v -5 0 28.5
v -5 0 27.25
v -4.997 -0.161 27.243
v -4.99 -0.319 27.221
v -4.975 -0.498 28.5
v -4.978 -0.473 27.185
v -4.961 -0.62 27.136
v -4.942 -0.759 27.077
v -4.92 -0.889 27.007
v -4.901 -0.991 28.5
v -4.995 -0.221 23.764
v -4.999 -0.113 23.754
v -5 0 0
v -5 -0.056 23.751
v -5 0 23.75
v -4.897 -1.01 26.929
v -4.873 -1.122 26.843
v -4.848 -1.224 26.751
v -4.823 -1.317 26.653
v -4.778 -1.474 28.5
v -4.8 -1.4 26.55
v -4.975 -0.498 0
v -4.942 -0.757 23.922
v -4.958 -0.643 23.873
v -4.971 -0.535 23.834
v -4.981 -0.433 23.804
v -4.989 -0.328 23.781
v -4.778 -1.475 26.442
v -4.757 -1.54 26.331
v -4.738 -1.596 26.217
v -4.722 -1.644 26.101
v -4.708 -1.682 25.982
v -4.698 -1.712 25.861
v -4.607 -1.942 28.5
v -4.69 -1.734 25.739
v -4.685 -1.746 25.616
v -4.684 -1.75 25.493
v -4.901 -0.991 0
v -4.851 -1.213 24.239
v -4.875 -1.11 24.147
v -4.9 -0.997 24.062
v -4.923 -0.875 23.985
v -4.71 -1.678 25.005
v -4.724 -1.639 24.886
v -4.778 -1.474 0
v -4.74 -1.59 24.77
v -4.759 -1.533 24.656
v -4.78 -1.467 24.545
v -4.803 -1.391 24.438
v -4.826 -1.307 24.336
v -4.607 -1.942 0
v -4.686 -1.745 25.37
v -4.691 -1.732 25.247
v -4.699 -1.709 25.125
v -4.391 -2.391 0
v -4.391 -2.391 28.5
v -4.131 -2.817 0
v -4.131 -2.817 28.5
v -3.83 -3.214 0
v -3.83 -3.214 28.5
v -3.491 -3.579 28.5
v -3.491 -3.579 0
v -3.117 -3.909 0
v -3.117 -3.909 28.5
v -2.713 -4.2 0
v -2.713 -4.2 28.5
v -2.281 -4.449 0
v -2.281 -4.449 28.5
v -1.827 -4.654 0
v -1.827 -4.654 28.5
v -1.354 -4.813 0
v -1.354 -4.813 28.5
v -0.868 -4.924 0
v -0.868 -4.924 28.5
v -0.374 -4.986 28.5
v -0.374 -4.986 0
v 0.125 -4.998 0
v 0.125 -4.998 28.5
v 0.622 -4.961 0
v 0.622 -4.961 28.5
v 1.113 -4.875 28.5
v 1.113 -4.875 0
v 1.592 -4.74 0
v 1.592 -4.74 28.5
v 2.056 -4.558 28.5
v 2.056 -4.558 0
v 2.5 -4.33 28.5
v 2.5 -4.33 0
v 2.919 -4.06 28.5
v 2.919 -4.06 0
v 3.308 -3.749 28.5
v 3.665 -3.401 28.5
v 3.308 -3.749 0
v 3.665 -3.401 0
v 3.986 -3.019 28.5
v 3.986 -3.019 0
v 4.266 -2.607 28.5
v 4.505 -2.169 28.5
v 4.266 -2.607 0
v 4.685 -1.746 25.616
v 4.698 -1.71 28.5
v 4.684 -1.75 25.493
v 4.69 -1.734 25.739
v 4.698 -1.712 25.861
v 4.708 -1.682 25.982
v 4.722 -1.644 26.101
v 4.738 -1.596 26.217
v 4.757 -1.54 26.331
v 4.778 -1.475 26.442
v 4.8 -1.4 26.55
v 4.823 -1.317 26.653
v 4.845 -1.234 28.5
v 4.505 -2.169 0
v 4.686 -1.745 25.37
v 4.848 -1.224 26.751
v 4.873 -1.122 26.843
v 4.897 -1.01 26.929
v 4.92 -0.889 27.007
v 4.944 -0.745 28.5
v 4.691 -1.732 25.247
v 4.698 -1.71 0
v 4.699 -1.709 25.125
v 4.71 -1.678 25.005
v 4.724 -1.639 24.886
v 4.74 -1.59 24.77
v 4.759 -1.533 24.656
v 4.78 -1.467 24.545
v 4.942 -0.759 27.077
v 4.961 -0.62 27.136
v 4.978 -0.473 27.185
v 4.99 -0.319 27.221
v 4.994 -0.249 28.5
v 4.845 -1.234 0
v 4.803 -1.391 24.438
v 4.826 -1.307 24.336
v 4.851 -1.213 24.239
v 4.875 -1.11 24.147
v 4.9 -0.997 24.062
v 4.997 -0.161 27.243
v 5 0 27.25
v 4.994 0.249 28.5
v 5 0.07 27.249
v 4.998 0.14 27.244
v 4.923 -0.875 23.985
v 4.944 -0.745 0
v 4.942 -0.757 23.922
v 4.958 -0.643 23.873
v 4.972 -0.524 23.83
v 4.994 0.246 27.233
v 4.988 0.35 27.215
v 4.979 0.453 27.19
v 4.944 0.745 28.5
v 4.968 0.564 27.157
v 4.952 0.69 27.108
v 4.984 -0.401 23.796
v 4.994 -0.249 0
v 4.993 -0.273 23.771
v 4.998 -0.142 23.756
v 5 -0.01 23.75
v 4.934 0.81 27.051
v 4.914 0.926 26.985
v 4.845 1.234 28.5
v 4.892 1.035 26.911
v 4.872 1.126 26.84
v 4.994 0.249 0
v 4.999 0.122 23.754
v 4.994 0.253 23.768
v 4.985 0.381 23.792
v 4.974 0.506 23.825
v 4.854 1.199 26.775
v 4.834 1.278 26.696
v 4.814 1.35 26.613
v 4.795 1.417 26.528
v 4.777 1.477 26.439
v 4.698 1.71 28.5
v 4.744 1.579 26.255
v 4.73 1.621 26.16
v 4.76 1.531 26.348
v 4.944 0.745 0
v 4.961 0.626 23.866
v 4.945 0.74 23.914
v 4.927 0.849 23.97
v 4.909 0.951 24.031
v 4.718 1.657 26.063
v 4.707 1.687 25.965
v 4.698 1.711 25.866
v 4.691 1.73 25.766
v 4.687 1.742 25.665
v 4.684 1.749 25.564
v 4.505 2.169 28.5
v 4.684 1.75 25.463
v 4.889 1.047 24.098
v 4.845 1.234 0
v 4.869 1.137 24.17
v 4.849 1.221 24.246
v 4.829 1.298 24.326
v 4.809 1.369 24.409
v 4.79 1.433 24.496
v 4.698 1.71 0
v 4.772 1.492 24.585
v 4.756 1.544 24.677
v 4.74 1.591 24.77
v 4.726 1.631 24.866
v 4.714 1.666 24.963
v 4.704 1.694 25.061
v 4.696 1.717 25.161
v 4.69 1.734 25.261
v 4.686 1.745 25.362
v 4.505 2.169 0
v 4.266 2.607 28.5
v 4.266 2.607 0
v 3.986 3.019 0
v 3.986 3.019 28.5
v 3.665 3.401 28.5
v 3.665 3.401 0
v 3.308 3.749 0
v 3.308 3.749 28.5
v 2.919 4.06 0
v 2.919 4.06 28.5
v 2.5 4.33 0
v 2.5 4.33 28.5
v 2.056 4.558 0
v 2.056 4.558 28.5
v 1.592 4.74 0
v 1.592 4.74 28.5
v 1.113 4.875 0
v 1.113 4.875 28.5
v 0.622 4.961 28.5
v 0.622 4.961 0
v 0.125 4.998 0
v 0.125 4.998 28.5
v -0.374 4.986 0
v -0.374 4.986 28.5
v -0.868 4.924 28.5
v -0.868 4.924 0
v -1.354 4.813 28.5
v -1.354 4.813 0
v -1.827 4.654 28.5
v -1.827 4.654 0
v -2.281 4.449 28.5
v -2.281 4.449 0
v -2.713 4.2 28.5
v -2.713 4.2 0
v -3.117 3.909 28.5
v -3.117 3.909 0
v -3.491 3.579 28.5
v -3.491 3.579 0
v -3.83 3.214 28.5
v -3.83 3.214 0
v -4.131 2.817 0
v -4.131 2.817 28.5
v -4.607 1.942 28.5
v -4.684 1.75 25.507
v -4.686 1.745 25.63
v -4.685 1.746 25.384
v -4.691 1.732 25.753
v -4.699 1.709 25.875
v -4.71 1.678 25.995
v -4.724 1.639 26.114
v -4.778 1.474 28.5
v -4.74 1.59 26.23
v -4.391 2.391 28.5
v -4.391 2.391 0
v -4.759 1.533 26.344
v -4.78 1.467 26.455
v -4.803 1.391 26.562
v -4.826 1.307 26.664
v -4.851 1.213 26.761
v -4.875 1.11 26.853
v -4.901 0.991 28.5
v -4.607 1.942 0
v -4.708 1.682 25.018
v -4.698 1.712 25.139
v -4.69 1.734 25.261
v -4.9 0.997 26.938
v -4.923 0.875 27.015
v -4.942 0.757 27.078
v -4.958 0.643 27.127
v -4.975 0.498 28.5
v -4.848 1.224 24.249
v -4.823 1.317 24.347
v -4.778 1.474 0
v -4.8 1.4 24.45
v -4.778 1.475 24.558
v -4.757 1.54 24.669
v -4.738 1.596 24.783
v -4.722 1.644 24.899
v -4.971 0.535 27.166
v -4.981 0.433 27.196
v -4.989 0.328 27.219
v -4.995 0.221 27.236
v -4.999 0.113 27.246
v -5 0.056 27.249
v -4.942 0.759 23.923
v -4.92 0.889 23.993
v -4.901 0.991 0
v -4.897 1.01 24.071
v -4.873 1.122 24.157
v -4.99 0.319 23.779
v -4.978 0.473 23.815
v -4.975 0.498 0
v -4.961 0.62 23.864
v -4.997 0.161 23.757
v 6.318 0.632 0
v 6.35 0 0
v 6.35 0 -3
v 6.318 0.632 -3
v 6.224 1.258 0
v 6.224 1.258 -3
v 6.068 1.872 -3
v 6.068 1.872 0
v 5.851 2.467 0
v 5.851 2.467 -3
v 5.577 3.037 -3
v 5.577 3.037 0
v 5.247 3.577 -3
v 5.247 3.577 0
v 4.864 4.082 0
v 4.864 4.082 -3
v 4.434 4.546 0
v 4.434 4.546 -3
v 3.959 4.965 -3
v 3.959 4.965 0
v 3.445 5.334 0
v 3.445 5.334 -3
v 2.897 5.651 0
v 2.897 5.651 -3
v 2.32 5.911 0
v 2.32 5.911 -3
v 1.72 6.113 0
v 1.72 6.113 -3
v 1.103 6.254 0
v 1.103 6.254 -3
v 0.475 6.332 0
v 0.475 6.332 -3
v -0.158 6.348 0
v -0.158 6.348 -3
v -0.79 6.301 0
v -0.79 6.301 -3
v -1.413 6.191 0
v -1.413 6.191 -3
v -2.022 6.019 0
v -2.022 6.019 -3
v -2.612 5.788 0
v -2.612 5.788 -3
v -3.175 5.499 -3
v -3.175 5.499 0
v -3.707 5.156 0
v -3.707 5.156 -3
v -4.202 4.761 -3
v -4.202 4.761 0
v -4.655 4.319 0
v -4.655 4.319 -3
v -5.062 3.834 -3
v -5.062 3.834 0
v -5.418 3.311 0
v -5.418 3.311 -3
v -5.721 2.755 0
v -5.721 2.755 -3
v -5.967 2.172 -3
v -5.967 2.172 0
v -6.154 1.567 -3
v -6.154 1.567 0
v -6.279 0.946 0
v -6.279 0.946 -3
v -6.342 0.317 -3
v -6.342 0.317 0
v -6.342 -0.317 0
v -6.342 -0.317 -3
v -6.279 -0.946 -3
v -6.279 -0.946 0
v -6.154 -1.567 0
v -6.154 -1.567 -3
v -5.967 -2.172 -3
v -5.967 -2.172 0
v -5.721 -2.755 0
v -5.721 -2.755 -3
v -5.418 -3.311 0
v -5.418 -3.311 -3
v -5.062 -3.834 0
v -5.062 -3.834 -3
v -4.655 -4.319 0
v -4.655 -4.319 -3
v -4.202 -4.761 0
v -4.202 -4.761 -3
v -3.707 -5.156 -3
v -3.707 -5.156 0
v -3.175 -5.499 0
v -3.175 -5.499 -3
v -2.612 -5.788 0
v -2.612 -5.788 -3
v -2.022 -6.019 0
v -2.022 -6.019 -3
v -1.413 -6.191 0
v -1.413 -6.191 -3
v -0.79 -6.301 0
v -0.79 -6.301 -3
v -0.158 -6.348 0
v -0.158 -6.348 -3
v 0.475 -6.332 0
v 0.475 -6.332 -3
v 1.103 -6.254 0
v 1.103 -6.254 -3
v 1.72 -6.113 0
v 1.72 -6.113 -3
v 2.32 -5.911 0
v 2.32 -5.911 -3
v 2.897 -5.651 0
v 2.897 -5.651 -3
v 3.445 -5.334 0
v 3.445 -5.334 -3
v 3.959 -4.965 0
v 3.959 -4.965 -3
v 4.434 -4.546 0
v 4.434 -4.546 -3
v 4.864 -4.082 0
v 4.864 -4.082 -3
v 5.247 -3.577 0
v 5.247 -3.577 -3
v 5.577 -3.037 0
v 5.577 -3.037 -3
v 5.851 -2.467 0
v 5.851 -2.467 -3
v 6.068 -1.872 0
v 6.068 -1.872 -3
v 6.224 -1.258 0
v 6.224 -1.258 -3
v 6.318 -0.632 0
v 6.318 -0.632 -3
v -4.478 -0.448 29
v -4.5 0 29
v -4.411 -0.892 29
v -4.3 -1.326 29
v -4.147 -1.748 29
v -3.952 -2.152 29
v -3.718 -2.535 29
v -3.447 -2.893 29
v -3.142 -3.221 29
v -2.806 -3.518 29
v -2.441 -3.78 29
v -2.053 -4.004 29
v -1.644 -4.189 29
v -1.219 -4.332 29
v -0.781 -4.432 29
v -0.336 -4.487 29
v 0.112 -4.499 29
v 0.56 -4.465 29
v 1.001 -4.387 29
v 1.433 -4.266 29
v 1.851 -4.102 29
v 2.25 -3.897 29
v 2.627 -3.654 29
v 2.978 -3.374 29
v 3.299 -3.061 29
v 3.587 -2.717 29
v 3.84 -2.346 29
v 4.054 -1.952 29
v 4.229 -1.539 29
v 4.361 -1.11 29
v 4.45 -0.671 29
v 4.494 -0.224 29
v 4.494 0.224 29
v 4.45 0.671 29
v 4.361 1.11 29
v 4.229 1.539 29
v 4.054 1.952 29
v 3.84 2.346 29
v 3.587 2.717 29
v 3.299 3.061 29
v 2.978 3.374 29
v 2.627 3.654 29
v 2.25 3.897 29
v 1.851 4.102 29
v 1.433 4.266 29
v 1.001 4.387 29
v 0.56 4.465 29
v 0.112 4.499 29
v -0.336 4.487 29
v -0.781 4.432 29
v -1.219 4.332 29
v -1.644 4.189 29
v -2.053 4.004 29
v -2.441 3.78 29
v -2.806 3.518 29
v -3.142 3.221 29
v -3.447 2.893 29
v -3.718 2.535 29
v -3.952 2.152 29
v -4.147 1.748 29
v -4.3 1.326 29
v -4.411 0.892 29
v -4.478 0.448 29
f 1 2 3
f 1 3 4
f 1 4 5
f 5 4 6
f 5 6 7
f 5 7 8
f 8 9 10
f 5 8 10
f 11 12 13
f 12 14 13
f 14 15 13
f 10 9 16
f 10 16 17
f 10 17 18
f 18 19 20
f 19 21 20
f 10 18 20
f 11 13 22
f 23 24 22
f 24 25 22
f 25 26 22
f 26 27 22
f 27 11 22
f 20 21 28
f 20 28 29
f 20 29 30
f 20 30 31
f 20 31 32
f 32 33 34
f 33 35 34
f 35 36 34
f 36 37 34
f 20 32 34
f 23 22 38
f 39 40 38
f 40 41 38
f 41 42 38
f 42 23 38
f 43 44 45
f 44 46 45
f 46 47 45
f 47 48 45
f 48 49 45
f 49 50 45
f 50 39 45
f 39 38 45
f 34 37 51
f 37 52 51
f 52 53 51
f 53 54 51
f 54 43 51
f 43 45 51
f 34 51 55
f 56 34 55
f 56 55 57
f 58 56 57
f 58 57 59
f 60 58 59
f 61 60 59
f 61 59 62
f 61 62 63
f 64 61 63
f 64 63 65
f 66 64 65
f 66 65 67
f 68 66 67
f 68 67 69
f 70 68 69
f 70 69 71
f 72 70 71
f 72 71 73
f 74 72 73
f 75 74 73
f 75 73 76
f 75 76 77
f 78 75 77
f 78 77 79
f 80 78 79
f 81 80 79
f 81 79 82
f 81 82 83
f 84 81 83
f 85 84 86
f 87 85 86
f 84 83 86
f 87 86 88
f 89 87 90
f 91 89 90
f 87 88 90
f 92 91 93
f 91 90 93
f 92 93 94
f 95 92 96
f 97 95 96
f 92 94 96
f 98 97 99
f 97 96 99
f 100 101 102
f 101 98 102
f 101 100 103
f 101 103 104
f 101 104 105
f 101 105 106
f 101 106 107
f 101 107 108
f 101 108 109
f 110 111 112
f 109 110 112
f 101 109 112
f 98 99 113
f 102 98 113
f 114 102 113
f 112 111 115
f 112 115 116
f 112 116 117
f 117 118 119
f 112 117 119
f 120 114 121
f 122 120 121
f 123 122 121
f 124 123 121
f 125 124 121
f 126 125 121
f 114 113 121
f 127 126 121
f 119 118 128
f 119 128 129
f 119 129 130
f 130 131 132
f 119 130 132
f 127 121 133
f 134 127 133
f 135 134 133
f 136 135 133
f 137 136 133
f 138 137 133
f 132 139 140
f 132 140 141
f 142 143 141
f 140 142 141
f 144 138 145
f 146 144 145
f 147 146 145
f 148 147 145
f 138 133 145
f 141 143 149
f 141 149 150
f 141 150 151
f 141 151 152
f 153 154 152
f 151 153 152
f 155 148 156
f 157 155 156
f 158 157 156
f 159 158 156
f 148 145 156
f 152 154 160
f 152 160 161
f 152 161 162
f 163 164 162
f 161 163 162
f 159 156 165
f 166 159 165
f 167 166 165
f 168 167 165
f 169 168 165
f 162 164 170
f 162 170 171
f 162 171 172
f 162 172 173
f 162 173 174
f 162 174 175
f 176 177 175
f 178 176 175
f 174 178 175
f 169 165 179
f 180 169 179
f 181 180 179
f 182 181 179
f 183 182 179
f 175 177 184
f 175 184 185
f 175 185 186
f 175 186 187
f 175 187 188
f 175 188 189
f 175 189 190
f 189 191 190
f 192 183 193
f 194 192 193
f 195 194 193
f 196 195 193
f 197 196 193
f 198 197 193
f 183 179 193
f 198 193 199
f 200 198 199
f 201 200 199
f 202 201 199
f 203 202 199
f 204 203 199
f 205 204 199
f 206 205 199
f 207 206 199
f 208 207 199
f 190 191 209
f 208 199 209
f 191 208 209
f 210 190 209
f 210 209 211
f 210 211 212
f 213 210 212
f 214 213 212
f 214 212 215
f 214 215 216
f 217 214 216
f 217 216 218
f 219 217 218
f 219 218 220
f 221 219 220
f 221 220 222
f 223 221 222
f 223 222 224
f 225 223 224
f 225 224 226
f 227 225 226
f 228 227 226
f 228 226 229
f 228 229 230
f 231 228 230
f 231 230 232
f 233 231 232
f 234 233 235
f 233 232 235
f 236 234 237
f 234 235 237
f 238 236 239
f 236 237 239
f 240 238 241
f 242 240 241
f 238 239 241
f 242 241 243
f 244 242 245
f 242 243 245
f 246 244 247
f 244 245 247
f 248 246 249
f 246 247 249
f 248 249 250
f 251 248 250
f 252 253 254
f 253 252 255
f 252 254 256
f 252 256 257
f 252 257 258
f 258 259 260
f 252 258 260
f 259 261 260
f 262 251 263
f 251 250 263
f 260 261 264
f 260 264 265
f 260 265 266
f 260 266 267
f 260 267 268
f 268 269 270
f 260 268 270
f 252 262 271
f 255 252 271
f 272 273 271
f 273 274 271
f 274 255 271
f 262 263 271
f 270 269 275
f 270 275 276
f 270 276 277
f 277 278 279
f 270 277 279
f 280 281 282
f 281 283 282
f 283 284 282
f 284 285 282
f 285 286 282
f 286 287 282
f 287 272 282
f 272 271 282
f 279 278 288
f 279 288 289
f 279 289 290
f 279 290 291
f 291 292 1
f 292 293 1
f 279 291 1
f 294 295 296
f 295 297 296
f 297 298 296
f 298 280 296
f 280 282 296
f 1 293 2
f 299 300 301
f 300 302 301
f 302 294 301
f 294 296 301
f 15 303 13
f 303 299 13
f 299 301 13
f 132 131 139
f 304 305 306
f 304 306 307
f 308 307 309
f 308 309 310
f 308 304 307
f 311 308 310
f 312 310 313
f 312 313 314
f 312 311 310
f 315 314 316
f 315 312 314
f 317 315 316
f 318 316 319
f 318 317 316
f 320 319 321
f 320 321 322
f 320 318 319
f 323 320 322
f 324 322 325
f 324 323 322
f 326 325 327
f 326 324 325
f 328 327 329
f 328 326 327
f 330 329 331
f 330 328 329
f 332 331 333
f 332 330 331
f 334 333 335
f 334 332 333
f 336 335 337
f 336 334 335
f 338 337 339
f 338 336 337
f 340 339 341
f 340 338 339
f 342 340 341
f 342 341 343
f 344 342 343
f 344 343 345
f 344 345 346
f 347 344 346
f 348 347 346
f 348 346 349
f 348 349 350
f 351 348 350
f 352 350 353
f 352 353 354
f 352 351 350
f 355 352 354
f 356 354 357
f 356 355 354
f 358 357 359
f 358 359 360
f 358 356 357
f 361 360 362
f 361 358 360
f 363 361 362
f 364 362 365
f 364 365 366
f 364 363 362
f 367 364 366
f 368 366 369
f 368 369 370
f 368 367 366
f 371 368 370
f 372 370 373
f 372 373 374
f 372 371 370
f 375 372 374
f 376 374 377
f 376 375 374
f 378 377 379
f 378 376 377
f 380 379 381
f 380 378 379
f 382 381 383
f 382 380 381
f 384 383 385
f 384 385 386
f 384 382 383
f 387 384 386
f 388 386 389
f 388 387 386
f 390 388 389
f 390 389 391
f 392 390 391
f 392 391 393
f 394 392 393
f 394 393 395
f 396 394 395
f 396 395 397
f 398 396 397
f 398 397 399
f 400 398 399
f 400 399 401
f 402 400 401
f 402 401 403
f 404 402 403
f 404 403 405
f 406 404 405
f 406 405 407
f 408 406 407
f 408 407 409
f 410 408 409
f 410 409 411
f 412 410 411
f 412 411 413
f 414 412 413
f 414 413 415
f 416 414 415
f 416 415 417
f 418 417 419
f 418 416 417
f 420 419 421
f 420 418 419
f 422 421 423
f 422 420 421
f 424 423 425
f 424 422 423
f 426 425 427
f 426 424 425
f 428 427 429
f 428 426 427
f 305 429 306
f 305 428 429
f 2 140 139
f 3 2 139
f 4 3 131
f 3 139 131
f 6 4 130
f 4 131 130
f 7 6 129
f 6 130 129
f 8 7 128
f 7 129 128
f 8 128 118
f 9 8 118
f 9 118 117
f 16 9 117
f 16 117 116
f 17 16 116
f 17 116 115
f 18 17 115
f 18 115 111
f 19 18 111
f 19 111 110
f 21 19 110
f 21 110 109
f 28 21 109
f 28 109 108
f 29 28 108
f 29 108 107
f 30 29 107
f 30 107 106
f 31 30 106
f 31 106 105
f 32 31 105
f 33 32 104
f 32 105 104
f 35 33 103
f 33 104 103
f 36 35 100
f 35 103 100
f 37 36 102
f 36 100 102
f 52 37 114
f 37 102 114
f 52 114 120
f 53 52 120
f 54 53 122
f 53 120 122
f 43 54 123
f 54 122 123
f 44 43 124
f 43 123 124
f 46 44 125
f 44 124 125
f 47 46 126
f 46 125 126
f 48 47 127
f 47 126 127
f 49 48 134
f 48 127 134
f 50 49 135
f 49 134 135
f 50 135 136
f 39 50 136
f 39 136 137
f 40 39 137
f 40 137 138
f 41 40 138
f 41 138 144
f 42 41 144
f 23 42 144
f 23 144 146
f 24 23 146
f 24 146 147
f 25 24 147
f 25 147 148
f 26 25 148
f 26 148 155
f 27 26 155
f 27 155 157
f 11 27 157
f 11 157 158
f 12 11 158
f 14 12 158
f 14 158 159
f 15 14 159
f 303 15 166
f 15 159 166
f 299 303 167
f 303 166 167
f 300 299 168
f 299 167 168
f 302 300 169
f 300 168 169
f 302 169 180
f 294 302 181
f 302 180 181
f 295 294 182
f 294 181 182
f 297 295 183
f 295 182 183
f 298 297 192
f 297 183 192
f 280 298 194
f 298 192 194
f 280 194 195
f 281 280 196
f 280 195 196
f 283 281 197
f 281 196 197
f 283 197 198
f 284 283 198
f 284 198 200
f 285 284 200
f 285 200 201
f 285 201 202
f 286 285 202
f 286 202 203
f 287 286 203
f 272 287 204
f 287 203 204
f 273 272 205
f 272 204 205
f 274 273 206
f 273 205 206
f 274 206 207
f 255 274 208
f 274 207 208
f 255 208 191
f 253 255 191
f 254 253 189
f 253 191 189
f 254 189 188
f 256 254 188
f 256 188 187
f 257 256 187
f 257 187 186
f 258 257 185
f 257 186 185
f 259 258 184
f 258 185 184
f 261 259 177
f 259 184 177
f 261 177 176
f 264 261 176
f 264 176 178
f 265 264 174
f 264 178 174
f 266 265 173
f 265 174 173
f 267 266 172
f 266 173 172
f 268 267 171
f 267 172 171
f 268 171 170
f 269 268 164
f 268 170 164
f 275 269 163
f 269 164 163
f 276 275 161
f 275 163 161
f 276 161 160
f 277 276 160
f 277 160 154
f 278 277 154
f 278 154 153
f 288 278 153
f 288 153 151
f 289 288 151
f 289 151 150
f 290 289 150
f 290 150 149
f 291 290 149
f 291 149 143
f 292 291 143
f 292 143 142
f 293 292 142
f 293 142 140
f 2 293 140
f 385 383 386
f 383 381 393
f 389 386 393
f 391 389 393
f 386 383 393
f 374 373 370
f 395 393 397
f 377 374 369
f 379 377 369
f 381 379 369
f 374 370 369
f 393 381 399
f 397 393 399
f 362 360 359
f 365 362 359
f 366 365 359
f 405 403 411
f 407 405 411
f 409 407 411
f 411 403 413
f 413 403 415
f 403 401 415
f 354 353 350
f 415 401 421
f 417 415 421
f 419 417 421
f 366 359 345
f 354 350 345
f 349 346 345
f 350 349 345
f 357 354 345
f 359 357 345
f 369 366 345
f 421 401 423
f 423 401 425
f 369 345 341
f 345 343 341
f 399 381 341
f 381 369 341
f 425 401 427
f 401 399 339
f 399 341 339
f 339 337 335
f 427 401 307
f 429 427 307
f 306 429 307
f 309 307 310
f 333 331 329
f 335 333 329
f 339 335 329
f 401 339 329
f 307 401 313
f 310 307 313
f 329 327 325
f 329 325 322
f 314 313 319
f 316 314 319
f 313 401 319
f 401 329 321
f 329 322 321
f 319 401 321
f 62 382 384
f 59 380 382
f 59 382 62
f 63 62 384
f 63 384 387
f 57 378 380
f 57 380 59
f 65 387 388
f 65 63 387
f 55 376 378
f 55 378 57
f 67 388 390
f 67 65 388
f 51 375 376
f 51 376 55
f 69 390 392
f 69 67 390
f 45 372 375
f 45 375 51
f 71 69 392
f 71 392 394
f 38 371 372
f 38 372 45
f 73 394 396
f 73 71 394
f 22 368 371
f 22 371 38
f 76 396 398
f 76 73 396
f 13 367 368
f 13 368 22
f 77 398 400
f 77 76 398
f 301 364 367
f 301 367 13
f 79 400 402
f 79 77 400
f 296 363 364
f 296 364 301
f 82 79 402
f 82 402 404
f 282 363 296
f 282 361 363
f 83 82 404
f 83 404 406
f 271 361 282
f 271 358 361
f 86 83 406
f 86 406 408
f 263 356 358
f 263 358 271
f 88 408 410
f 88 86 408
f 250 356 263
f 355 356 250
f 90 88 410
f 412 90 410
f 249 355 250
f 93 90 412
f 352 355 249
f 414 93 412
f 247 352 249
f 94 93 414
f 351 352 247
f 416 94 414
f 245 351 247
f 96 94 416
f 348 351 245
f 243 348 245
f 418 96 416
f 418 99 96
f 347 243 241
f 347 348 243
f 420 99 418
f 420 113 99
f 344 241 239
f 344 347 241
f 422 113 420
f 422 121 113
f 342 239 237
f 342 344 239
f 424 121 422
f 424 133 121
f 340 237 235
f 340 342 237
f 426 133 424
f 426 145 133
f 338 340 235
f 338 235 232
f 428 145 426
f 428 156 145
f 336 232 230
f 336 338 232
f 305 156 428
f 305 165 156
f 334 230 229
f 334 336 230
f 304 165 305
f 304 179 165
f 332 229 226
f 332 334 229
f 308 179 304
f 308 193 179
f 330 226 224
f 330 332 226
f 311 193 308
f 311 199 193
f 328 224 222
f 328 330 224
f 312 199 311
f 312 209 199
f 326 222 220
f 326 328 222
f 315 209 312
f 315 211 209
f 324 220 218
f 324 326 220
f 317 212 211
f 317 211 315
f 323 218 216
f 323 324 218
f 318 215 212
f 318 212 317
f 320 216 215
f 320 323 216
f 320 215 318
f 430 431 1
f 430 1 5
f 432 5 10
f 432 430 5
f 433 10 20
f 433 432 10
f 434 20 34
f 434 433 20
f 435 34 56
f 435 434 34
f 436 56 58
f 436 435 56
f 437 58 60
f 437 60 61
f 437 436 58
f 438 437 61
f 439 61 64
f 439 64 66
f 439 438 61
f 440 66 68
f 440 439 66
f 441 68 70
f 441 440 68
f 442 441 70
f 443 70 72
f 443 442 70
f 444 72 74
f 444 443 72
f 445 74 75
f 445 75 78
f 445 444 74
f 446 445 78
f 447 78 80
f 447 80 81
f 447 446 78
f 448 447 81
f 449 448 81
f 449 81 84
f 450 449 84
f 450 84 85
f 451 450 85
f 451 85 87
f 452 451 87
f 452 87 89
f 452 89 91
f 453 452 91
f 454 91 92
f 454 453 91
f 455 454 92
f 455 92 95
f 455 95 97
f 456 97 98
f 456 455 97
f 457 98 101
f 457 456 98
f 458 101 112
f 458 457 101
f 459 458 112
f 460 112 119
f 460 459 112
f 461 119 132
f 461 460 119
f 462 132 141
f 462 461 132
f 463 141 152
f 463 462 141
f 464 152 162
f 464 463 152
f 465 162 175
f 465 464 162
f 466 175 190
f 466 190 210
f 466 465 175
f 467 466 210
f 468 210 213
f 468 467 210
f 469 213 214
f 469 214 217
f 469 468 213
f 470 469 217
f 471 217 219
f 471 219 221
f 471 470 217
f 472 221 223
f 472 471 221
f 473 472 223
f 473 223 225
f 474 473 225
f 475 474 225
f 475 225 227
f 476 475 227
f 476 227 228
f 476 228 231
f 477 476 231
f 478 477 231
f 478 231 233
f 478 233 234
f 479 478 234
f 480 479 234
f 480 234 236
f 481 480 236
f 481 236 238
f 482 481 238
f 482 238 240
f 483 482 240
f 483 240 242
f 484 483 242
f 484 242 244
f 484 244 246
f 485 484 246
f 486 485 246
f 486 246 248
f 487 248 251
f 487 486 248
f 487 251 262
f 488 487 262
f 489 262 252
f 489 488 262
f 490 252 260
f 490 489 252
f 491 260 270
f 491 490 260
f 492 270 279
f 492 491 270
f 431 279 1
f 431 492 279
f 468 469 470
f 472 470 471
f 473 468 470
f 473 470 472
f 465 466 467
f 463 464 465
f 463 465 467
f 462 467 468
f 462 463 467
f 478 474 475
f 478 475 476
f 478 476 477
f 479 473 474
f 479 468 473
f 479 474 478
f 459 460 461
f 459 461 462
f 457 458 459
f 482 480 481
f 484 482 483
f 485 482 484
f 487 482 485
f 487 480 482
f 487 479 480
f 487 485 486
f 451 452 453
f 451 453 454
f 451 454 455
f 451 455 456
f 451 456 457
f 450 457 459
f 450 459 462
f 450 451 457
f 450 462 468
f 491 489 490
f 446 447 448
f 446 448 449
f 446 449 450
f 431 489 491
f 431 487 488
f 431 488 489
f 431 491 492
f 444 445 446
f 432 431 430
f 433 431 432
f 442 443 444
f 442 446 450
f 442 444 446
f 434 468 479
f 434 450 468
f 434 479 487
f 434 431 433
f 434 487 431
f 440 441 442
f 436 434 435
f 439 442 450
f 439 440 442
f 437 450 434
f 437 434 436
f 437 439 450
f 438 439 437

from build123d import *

# Parameters (mm, degrees)
ESBO_O1_R             = 5
EXTRUS_O1_DEPTH       = 29
ESBO_O1_3_R           = 6.35
EXTRUS_O2_DEPTH       = 3
ESBO_O2_R             = 1.75
CORTE_EXTRUS_O1_DEPTH = 7.5
CHANFRO1_SIZE         = 0.5


with BuildPart() as part:
    # Esboço1 → Extrusão1 (new body)
    with BuildSketch(Plane.XY):
        Circle(ESBO_O1_R)
    extrude(amount=EXTRUS_O1_DEPTH)

    # Esboço1<3> → Extrusão2 (add)
    with BuildSketch(Plane.XY):
        Circle(ESBO_O1_3_R)
    extrude(amount=-EXTRUS_O2_DEPTH)

    # Esboço2 → Corte-extrusão1 (cut, symmetric)
    with BuildSketch(Plane(origin=(0, 0, 0), x_dir=(0, 0, -1), z_dir=(1, 0, 0))):
        with Locations((-25.5, 0)):
            Circle(ESBO_O2_R)
    extrude(amount=CORTE_EXTRUS_O1_DEPTH, both=True, mode=Mode.SUBTRACT)

    # Chanfro1
    chanfro1_edges = [part.edges().sort_by_distance(p)[0] for p in [
        (-5, 0, 29),
    ]]
    chamfer(chanfro1_edges, length=CHANFRO1_SIZE)


solid = part.part
